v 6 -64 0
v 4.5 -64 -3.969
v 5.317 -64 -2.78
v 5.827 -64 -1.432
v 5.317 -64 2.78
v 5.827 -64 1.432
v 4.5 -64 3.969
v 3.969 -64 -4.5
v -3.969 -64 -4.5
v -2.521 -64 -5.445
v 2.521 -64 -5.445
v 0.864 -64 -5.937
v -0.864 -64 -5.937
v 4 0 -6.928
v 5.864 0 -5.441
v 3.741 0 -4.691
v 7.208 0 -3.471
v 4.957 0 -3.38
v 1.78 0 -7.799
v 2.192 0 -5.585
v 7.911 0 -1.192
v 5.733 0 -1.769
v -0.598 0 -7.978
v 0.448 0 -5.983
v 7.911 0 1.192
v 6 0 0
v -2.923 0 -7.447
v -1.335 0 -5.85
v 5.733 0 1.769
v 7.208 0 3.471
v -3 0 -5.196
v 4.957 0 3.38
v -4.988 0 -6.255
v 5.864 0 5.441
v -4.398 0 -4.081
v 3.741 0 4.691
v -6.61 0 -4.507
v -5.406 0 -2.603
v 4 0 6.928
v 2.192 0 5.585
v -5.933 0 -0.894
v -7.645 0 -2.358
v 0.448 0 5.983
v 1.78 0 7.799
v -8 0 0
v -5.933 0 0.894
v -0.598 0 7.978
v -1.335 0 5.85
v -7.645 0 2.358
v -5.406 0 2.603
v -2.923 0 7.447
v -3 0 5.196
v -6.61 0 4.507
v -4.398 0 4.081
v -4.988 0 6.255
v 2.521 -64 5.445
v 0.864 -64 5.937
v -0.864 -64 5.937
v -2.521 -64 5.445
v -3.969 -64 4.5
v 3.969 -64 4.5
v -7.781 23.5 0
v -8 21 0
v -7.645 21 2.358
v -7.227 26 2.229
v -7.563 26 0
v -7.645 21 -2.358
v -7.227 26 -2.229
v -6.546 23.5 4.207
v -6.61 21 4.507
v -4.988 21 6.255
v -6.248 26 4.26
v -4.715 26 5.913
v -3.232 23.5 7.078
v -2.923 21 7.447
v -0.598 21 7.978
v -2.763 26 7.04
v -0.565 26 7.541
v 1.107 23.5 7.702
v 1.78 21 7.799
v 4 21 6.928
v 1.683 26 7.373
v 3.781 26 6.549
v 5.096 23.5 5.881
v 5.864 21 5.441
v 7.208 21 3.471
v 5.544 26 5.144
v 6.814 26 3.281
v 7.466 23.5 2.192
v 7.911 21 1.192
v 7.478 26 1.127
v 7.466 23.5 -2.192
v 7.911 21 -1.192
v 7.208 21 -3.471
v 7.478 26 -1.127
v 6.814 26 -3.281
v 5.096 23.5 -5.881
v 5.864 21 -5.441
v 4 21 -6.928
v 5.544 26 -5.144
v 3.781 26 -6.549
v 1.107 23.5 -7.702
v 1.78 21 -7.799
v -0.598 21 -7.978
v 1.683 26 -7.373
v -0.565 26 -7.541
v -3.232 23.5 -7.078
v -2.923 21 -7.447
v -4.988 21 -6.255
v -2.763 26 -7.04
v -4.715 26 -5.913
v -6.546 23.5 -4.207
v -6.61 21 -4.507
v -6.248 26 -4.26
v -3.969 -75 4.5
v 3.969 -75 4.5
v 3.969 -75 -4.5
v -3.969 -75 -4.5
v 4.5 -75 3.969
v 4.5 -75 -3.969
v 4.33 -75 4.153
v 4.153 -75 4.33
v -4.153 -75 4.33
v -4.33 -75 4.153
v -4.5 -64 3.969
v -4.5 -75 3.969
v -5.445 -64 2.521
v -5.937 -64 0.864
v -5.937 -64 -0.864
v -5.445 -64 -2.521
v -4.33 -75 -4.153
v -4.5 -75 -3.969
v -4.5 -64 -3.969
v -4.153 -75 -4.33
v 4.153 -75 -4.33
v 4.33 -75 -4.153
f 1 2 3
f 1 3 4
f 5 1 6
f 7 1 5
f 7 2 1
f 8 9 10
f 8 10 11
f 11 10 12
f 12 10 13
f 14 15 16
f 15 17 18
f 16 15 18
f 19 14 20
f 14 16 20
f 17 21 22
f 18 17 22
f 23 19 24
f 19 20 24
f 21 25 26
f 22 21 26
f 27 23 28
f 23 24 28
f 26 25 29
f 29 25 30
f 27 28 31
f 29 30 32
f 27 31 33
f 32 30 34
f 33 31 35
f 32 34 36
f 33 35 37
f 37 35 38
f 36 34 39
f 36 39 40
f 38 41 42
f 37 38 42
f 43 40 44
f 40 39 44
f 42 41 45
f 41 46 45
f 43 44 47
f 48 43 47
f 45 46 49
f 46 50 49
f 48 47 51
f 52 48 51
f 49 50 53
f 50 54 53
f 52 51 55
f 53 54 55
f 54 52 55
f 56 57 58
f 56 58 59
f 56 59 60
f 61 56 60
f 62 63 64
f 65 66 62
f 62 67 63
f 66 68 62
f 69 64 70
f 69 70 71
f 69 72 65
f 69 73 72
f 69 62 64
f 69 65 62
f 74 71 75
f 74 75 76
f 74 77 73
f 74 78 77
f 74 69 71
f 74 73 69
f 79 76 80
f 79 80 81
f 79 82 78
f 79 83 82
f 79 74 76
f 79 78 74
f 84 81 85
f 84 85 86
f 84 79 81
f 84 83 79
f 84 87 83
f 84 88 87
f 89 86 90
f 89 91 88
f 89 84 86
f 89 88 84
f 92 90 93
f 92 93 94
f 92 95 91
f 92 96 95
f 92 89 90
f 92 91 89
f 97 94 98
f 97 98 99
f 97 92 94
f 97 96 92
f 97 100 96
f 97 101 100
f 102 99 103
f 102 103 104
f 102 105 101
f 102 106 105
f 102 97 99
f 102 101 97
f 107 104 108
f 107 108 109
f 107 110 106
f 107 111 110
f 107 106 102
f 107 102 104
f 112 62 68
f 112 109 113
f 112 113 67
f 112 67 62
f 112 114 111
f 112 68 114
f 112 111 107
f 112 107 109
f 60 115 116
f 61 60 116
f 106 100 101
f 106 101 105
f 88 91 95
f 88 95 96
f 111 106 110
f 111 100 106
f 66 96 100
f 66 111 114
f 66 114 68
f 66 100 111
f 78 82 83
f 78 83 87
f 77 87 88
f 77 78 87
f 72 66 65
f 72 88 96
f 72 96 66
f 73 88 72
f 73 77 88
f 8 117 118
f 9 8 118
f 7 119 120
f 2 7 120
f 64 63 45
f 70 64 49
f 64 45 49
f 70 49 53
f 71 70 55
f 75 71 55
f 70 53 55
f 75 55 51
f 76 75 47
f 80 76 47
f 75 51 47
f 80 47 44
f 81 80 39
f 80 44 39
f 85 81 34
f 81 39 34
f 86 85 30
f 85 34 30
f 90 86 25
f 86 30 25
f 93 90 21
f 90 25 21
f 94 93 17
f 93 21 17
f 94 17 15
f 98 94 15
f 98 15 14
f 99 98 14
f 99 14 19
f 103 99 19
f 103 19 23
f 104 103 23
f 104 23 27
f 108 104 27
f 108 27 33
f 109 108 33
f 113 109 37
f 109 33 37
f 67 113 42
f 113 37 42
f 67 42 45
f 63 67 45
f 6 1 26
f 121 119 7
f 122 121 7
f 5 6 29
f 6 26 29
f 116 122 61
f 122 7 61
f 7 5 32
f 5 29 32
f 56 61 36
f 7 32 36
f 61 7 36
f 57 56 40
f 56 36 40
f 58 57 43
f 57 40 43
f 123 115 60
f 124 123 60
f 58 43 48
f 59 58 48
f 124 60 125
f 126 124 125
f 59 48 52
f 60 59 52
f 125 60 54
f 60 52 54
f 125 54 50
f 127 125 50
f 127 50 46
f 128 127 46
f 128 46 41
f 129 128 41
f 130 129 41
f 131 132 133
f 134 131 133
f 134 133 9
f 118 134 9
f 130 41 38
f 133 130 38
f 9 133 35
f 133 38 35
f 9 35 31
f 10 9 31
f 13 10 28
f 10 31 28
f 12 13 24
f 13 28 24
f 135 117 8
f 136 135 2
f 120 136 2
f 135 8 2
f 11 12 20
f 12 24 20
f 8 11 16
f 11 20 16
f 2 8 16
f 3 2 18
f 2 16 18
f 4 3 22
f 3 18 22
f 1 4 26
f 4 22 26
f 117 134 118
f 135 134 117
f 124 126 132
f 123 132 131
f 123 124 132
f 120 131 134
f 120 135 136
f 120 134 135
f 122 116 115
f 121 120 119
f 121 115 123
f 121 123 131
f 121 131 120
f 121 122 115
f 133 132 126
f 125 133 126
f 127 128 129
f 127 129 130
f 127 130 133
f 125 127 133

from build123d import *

# Parameters (mm, degrees)
F0_R     = 6
F1_DEPTH = 75
F3_DEPTH = 11
F4_R     = 8
F5_DEPTH = 26
F6_SIZE2 = 0.4374433176
F6_SIZE  = 5


with BuildPart() as f1:
    # F0 (on Front) → F1 (new body)
    with BuildSketch(Plane.XZ):
        Circle(F0_R)
    extrude(amount=F1_DEPTH)

    # F2 (on face) → F3 (cut)
    with BuildSketch(Plane.XZ.offset(75)):
        with BuildLine():
            Line((4.5, 3.9686269666), (4.5, -3.9686269666))
            ThreePointArc((4.5, -3.9686269666), (5.6124860802, -2.1213203436), (6, 0))
            ThreePointArc((6, 0), (5.6124860802, 2.1213203436), (4.5, 3.9686269666))
        make_face()
        with BuildLine():
            ThreePointArc((3.9686269666, 4.5), (0, 6), (-3.9686269666, 4.5))
            Line((-3.9686269666, 4.5), (3.9686269666, 4.5))
        make_face()
        with BuildLine():
            Line((3.9686269666, -4.5), (-3.9686269666, -4.5))
            ThreePointArc((-3.9686269666, -4.5), (0, -6), (3.9686269666, -4.5))
        make_face()
        with BuildLine():
            ThreePointArc((-4.5, 3.9686269666), (-6, 0), (-4.5, -3.9686269666))
            Line((-4.5, -3.9686269666), (-4.5, 3.9686269666))
        make_face()
    extrude(amount=-F3_DEPTH, mode=Mode.SUBTRACT)

    # F4 (on face) → F5 (join)
    with BuildSketch(Plane(origin=(0, 0, 0), x_dir=(-1, 0, 0), z_dir=(0, 1, 0))):
        Circle(F4_R)
    extrude(amount=F5_DEPTH)

    # F6
    f6_edges = [f1.edges().sort_by_distance(p)[0] for p in [
        (8, 26, 0),
    ]]
    f6_side = f1.faces().sort_by_distance((8, 13, 0))[0]
    chamfer(f6_edges, length=F6_SIZE, length2=F6_SIZE2, reference=f6_side)


solid = f1.part
